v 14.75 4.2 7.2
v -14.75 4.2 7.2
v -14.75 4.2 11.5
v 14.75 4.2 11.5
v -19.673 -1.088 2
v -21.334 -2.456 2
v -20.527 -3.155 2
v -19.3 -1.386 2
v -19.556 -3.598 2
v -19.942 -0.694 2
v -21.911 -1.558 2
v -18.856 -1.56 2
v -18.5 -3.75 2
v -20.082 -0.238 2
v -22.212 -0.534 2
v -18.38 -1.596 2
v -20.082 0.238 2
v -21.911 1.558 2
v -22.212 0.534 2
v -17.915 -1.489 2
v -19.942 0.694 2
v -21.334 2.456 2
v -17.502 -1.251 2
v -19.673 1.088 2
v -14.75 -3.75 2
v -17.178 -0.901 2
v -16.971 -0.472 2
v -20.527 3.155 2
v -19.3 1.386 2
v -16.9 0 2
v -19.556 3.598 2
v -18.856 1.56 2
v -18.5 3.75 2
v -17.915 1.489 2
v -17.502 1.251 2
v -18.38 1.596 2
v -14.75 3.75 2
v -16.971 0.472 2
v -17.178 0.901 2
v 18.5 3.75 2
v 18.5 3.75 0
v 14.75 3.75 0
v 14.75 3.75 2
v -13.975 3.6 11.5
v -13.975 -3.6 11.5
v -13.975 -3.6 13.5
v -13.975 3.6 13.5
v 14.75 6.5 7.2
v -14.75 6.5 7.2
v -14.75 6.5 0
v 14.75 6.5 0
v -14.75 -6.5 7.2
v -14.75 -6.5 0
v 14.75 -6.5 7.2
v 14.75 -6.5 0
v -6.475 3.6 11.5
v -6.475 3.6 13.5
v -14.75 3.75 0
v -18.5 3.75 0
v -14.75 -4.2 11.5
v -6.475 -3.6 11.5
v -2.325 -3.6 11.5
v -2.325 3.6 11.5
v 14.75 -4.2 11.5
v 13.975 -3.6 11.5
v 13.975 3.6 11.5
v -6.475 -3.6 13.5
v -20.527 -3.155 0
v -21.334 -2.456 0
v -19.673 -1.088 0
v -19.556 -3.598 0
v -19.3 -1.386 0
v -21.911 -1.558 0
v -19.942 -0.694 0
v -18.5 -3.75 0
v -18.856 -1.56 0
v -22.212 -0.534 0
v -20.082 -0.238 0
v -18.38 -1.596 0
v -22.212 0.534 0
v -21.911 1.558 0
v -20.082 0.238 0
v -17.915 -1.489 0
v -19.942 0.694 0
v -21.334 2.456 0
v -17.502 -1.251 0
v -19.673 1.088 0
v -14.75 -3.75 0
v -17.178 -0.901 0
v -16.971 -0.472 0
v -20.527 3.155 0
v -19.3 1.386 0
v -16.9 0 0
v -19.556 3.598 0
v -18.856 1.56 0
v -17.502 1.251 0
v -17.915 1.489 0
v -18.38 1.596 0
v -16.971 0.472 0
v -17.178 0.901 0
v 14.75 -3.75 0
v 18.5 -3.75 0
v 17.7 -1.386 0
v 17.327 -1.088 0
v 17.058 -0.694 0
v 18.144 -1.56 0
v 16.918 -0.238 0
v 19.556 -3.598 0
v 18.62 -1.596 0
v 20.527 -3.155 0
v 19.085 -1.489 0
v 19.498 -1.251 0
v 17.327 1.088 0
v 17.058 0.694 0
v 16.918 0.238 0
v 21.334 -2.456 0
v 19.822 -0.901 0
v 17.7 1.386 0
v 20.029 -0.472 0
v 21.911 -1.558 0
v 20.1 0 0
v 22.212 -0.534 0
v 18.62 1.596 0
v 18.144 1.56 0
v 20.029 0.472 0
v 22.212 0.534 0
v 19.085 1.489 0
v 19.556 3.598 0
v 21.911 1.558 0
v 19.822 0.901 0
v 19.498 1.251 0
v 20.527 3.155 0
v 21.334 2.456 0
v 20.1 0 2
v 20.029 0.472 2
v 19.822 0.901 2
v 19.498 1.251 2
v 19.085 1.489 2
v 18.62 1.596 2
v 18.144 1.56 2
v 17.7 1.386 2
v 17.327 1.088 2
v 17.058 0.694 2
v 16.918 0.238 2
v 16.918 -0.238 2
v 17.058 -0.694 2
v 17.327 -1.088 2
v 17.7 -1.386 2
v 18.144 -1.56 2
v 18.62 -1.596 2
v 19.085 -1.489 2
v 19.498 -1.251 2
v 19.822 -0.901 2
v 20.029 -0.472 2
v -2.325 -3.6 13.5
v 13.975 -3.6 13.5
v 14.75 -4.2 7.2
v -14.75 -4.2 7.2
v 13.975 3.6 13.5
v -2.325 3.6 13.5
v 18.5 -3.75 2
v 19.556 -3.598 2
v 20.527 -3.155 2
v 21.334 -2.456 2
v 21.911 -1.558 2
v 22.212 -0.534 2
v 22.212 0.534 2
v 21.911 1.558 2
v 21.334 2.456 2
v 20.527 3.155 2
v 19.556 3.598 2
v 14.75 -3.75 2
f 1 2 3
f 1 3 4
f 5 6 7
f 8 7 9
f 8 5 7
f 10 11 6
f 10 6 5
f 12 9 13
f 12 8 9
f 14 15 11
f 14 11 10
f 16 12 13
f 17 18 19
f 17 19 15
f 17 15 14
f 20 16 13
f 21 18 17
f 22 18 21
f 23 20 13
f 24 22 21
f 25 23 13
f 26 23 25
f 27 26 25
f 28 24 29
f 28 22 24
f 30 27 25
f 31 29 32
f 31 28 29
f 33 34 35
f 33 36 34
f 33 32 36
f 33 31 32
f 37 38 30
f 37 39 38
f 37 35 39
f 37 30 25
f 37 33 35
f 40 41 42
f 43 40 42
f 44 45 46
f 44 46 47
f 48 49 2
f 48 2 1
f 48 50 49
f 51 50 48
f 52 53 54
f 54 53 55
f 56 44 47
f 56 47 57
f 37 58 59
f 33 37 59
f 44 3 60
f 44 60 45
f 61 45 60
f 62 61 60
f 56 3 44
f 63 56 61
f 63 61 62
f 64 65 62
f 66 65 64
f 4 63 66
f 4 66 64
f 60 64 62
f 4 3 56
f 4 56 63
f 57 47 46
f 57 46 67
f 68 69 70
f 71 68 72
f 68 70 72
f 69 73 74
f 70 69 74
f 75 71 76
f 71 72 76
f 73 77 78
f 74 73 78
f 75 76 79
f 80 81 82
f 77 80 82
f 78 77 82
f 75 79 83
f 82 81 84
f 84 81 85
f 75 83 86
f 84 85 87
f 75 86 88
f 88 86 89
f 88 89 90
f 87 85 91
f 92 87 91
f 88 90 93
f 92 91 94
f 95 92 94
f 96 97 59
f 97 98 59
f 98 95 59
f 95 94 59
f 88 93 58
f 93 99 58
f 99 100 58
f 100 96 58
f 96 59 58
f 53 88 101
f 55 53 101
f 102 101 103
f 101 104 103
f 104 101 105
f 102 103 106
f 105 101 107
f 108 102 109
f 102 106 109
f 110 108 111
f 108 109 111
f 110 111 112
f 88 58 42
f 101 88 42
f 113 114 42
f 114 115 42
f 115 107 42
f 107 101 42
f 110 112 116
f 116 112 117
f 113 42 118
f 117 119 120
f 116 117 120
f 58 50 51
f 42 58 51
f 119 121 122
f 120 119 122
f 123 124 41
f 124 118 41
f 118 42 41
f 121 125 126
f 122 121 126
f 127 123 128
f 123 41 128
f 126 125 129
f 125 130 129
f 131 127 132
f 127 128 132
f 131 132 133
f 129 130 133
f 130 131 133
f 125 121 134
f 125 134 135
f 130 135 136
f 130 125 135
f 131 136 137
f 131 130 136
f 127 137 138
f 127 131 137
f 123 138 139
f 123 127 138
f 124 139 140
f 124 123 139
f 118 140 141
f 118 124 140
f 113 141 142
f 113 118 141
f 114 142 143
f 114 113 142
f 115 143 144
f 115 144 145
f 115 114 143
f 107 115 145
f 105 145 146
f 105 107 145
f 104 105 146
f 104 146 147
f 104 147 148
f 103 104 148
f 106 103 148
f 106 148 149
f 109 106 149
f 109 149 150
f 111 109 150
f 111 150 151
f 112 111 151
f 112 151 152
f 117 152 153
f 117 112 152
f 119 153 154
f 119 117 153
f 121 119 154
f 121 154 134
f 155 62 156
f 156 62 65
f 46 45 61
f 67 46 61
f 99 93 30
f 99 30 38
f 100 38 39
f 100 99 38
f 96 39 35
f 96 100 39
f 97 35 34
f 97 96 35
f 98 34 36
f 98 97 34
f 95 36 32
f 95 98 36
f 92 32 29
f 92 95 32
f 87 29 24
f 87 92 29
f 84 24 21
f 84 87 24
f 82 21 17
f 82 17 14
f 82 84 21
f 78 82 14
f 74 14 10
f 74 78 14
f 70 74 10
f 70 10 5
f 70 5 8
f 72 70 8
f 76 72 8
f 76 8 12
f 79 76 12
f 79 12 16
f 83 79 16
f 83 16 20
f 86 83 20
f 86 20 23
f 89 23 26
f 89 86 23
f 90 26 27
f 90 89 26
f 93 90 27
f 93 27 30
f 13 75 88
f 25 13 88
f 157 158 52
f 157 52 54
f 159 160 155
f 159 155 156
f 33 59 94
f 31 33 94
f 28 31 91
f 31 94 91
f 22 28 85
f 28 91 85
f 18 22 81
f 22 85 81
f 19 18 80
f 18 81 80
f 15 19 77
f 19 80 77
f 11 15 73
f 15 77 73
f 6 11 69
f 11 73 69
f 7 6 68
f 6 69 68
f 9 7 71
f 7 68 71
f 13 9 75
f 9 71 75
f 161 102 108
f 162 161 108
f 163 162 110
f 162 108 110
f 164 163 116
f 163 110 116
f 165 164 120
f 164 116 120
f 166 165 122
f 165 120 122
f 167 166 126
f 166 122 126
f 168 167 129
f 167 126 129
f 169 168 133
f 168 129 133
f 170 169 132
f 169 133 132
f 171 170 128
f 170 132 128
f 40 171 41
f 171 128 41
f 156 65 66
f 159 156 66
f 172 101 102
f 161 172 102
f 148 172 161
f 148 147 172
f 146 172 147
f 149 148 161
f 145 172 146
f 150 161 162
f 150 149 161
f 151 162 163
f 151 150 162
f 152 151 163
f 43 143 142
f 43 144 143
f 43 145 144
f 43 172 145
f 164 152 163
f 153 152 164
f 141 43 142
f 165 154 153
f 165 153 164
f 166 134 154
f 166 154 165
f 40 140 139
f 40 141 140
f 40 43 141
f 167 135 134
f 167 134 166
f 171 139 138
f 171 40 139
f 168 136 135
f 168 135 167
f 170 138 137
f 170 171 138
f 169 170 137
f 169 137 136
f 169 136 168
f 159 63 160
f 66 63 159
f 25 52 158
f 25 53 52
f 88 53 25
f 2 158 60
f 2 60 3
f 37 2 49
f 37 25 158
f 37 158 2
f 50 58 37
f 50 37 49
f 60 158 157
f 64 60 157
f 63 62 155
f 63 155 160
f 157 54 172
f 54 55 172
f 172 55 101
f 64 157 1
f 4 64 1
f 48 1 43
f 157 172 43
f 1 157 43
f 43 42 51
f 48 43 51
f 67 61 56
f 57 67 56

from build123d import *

# Parameters (mm, degrees)
F0_R     = 1.6
F1_DEPTH = 2
F2_W     = 29.5
F2_H     = 13
F3_DEPTH = 5.2
F4_W     = 29.5
F4_H     = 8.4
F5_DEPTH = 4.3
F6_W     = 16.3
F6_H     = 7.2
F6_W_2   = 7.5
F7_DEPTH = 2


with BuildPart() as f1:
    # F0 (on Top) → F1 (new body)
    with BuildSketch(Plane.XY):
        Polygon((14.75, 6.5), (-14.75, 6.5), (-14.75, 3.75), (-14.75, -3.75), (-14.75, -6.5), (14.75, -6.5), (14.75, -3.75), (14.75, 3.75), align=None)
        with BuildLine():
            Line((-14.75, -3.75), (-14.75, 3.75))
            Line((-14.75, 3.75), (-18.5, 3.75))
            ThreePointArc((-18.5, 3.75), (-22.25, 0), (-18.5, -3.75))
            Line((-18.5, -3.75), (-14.75, -3.75))
        make_face()
        with Locations((-18.5, 0)):
            Circle(F0_R, mode=Mode.SUBTRACT)
        with BuildLine():
            Line((18.5, 3.75), (14.75, 3.75))
            Line((14.75, 3.75), (14.75, -3.75))
            Line((14.75, -3.75), (18.5, -3.75))
            ThreePointArc((18.5, -3.75), (22.25, 0), (18.5, 3.75))
        make_face()
        with Locations((18.5, 0)):
            Circle(F0_R, mode=Mode.SUBTRACT)
    extrude(amount=F1_DEPTH)

    # F2 (on face) → F3 (join)
    with BuildSketch(Plane.XY.offset(2)):
        Rectangle(F2_W, F2_H)
    extrude(amount=F3_DEPTH)

    # F4 (on face) → F5 (join)
    with BuildSketch(Plane.XY.offset(7.2)):
        Rectangle(F4_W, F4_H)
    extrude(amount=F5_DEPTH)

    # F6 (on face) → F7 (join)
    with BuildSketch(Plane.XY.offset(11.5)):
        with Locations((5.825, 0)):
            Rectangle(F6_W, F6_H)
        with Locations((-10.225, 0)):
            Rectangle(F6_W_2, F6_H)
    extrude(amount=F7_DEPTH)


solid = f1.part
